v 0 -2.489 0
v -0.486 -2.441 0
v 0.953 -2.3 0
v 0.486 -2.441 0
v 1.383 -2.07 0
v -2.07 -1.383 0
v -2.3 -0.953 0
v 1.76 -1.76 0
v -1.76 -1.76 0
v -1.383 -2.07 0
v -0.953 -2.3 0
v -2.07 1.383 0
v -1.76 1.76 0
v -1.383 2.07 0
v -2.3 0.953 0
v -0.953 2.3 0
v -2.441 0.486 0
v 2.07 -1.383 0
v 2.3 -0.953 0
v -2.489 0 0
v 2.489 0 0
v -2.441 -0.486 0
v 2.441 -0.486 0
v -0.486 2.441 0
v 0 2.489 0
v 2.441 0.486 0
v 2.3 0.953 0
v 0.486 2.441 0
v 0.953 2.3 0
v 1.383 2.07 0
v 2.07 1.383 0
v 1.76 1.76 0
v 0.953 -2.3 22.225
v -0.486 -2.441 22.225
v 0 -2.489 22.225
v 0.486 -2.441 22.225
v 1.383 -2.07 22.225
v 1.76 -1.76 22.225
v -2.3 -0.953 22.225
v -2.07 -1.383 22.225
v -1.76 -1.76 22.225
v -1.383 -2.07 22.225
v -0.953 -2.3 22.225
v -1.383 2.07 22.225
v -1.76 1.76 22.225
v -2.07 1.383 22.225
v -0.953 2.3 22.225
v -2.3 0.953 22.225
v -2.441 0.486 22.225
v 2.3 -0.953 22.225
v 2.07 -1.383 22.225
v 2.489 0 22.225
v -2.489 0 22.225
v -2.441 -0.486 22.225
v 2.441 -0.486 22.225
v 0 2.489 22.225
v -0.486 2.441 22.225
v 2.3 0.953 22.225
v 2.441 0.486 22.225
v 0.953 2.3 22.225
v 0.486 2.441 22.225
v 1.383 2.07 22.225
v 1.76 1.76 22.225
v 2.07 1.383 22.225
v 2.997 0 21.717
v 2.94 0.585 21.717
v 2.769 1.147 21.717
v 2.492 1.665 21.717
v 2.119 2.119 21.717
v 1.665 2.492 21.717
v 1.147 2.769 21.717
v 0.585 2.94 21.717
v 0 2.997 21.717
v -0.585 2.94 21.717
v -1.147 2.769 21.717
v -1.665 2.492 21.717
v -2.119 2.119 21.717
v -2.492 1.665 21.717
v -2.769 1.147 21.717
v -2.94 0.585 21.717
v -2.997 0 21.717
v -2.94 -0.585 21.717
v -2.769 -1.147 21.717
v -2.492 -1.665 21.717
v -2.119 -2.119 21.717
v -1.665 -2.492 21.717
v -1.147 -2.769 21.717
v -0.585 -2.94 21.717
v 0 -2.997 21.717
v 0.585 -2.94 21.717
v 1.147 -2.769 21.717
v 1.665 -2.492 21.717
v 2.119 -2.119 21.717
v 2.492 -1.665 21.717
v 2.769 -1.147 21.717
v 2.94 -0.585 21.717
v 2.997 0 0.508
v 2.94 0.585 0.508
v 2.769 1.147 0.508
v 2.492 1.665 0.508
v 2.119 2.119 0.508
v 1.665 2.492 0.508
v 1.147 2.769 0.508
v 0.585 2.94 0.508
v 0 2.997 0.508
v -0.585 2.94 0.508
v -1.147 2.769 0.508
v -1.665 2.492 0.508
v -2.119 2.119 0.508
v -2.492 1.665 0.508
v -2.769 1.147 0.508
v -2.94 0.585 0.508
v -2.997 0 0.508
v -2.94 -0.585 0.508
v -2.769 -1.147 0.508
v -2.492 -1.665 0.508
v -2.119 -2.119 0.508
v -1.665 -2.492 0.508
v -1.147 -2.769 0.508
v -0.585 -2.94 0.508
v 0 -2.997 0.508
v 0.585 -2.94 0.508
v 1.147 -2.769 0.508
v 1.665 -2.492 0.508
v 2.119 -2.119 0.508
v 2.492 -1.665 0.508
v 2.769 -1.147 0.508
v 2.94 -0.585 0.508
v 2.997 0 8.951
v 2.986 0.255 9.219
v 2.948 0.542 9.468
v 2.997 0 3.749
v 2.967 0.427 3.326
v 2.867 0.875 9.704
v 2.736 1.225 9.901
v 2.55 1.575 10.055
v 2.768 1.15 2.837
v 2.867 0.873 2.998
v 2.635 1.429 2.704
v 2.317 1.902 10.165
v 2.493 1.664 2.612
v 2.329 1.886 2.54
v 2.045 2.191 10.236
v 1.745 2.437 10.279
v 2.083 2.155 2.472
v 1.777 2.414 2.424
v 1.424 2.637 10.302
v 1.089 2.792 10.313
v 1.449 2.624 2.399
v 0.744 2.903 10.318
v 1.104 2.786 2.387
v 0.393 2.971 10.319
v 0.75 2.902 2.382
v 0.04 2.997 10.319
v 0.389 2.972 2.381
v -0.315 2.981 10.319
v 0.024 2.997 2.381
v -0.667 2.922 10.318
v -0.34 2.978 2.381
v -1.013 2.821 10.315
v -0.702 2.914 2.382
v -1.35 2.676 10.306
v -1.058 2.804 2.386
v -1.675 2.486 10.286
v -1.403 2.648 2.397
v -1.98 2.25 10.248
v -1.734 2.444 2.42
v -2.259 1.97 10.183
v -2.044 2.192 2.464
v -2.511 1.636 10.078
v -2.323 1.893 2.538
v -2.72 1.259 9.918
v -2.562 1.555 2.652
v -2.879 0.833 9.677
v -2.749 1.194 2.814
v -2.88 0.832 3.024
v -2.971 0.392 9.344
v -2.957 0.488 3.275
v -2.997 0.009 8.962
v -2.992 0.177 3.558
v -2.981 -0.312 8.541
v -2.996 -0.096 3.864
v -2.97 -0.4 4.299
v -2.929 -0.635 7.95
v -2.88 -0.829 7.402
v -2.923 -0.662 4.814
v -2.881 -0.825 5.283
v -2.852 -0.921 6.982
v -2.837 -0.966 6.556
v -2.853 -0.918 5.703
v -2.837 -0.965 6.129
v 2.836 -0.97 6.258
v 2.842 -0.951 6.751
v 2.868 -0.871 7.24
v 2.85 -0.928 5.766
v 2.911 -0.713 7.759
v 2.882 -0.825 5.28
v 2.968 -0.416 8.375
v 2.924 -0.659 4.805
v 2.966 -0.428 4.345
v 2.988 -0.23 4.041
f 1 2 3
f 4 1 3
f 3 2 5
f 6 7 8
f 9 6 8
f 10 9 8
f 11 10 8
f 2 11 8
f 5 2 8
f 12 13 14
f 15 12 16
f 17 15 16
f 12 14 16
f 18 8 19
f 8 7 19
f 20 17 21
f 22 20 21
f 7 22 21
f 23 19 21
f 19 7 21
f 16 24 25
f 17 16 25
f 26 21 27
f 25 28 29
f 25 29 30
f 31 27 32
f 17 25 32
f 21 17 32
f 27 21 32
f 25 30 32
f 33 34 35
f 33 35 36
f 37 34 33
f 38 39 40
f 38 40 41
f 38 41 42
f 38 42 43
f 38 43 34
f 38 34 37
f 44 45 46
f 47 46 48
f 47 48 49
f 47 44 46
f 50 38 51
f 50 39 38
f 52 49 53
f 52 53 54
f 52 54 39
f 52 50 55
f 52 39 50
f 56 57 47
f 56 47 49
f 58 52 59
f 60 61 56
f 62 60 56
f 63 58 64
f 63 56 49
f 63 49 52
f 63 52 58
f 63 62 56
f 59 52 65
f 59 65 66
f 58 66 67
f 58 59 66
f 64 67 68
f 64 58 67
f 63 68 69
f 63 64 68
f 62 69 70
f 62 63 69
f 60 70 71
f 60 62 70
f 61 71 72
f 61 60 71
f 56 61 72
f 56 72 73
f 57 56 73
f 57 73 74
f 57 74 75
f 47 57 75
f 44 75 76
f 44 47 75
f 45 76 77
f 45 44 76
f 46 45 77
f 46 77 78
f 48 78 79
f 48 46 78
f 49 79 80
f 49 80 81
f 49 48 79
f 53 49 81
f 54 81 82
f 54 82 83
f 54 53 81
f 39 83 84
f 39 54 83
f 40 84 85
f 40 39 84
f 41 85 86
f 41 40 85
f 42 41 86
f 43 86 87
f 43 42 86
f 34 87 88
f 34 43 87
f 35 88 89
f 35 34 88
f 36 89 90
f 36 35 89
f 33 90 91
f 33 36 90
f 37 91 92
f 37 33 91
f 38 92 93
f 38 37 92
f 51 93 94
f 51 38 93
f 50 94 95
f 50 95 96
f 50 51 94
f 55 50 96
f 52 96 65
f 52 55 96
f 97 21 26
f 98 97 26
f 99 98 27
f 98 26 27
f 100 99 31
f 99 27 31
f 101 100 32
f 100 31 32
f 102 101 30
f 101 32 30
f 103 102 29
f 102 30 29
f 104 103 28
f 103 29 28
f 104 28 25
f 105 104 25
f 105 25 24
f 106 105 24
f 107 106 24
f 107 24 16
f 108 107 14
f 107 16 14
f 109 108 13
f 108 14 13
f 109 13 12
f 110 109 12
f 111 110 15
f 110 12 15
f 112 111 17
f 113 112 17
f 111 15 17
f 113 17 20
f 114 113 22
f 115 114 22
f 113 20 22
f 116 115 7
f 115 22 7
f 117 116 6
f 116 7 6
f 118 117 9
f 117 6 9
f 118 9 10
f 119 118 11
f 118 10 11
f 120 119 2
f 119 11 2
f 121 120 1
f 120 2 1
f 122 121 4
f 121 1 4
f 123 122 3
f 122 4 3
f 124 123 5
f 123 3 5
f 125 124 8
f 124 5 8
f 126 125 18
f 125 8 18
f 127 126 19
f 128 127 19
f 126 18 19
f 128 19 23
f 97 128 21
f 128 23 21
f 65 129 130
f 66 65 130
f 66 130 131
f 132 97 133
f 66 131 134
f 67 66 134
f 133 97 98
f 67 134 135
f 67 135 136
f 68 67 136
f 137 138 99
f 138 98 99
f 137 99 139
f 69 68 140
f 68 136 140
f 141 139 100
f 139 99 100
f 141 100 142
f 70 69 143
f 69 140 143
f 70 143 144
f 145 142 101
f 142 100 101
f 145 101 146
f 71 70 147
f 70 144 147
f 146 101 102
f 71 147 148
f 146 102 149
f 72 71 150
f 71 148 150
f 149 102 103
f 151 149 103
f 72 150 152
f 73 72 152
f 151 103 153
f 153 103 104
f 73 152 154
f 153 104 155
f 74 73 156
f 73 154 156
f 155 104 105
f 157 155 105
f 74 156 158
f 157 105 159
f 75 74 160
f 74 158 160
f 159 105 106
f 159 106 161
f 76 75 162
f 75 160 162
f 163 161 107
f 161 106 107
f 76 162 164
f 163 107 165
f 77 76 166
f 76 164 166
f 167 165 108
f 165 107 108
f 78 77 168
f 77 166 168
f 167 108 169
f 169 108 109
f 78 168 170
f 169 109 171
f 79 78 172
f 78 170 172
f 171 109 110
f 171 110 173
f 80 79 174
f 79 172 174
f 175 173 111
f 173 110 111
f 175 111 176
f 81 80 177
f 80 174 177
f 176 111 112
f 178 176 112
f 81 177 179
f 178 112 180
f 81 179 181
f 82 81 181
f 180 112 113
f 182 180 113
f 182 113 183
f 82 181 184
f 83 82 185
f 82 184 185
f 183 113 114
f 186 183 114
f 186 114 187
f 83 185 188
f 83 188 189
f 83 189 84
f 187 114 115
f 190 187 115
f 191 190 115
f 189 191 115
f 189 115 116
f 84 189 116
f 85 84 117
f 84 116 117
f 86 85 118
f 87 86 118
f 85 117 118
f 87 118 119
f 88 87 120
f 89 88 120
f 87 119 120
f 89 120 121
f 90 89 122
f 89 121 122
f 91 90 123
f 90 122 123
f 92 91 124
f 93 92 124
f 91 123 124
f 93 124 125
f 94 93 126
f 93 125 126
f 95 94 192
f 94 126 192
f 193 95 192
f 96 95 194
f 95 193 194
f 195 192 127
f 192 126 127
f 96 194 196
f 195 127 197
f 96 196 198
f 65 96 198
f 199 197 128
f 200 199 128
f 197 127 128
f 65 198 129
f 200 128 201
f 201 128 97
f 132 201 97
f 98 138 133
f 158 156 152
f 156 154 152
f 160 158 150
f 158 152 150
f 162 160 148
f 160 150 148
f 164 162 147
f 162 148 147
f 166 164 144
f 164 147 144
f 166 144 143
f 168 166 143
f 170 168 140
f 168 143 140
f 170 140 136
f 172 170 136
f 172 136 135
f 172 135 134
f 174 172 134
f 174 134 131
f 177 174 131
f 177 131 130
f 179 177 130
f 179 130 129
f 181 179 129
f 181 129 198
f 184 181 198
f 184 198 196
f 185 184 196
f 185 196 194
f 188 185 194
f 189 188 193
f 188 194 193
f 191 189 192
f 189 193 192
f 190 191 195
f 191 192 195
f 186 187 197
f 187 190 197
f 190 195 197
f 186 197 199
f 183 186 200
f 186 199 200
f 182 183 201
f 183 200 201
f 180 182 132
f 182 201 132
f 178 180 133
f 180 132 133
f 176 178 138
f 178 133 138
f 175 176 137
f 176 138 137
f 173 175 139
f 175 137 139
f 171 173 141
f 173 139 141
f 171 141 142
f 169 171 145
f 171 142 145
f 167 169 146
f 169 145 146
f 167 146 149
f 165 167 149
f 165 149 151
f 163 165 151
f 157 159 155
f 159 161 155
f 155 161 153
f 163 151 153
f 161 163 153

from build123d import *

# Parameters (mm, degrees)
F0_R     = 2.9972
F1_DEPTH = 22.225
F2_R     = 3.96875
F3_DEPTH = 12.7
F5_SIZE  = 0.508


with BuildPart() as f1:
    # F0 (on Top) → F1 (new body)
    with BuildSketch(Plane.XY):
        Circle(F0_R)
    extrude(amount=F1_DEPTH)


with BuildPart() as f3:
    # F2 (on Right) → F3 (new body, symmetric)
    with BuildSketch(Plane.YZ):
        with Locations((2.9972, 6.35)):
            Circle(F2_R)
    extrude(amount=F3_DEPTH, both=True)


with BuildPart() as f1_1:
    add(f1.part)

    # F4: cut F3
    add(f3.part, mode=Mode.SUBTRACT)

    # F5
    f5_edges = [f1_1.edges().sort_by_distance(p)[0] for p in [
        (-2.9972, 0, 22.225),
        (-2.9972, 0, 0),
    ]]
    chamfer(f5_edges, length=F5_SIZE)


solid = f1_1.part
